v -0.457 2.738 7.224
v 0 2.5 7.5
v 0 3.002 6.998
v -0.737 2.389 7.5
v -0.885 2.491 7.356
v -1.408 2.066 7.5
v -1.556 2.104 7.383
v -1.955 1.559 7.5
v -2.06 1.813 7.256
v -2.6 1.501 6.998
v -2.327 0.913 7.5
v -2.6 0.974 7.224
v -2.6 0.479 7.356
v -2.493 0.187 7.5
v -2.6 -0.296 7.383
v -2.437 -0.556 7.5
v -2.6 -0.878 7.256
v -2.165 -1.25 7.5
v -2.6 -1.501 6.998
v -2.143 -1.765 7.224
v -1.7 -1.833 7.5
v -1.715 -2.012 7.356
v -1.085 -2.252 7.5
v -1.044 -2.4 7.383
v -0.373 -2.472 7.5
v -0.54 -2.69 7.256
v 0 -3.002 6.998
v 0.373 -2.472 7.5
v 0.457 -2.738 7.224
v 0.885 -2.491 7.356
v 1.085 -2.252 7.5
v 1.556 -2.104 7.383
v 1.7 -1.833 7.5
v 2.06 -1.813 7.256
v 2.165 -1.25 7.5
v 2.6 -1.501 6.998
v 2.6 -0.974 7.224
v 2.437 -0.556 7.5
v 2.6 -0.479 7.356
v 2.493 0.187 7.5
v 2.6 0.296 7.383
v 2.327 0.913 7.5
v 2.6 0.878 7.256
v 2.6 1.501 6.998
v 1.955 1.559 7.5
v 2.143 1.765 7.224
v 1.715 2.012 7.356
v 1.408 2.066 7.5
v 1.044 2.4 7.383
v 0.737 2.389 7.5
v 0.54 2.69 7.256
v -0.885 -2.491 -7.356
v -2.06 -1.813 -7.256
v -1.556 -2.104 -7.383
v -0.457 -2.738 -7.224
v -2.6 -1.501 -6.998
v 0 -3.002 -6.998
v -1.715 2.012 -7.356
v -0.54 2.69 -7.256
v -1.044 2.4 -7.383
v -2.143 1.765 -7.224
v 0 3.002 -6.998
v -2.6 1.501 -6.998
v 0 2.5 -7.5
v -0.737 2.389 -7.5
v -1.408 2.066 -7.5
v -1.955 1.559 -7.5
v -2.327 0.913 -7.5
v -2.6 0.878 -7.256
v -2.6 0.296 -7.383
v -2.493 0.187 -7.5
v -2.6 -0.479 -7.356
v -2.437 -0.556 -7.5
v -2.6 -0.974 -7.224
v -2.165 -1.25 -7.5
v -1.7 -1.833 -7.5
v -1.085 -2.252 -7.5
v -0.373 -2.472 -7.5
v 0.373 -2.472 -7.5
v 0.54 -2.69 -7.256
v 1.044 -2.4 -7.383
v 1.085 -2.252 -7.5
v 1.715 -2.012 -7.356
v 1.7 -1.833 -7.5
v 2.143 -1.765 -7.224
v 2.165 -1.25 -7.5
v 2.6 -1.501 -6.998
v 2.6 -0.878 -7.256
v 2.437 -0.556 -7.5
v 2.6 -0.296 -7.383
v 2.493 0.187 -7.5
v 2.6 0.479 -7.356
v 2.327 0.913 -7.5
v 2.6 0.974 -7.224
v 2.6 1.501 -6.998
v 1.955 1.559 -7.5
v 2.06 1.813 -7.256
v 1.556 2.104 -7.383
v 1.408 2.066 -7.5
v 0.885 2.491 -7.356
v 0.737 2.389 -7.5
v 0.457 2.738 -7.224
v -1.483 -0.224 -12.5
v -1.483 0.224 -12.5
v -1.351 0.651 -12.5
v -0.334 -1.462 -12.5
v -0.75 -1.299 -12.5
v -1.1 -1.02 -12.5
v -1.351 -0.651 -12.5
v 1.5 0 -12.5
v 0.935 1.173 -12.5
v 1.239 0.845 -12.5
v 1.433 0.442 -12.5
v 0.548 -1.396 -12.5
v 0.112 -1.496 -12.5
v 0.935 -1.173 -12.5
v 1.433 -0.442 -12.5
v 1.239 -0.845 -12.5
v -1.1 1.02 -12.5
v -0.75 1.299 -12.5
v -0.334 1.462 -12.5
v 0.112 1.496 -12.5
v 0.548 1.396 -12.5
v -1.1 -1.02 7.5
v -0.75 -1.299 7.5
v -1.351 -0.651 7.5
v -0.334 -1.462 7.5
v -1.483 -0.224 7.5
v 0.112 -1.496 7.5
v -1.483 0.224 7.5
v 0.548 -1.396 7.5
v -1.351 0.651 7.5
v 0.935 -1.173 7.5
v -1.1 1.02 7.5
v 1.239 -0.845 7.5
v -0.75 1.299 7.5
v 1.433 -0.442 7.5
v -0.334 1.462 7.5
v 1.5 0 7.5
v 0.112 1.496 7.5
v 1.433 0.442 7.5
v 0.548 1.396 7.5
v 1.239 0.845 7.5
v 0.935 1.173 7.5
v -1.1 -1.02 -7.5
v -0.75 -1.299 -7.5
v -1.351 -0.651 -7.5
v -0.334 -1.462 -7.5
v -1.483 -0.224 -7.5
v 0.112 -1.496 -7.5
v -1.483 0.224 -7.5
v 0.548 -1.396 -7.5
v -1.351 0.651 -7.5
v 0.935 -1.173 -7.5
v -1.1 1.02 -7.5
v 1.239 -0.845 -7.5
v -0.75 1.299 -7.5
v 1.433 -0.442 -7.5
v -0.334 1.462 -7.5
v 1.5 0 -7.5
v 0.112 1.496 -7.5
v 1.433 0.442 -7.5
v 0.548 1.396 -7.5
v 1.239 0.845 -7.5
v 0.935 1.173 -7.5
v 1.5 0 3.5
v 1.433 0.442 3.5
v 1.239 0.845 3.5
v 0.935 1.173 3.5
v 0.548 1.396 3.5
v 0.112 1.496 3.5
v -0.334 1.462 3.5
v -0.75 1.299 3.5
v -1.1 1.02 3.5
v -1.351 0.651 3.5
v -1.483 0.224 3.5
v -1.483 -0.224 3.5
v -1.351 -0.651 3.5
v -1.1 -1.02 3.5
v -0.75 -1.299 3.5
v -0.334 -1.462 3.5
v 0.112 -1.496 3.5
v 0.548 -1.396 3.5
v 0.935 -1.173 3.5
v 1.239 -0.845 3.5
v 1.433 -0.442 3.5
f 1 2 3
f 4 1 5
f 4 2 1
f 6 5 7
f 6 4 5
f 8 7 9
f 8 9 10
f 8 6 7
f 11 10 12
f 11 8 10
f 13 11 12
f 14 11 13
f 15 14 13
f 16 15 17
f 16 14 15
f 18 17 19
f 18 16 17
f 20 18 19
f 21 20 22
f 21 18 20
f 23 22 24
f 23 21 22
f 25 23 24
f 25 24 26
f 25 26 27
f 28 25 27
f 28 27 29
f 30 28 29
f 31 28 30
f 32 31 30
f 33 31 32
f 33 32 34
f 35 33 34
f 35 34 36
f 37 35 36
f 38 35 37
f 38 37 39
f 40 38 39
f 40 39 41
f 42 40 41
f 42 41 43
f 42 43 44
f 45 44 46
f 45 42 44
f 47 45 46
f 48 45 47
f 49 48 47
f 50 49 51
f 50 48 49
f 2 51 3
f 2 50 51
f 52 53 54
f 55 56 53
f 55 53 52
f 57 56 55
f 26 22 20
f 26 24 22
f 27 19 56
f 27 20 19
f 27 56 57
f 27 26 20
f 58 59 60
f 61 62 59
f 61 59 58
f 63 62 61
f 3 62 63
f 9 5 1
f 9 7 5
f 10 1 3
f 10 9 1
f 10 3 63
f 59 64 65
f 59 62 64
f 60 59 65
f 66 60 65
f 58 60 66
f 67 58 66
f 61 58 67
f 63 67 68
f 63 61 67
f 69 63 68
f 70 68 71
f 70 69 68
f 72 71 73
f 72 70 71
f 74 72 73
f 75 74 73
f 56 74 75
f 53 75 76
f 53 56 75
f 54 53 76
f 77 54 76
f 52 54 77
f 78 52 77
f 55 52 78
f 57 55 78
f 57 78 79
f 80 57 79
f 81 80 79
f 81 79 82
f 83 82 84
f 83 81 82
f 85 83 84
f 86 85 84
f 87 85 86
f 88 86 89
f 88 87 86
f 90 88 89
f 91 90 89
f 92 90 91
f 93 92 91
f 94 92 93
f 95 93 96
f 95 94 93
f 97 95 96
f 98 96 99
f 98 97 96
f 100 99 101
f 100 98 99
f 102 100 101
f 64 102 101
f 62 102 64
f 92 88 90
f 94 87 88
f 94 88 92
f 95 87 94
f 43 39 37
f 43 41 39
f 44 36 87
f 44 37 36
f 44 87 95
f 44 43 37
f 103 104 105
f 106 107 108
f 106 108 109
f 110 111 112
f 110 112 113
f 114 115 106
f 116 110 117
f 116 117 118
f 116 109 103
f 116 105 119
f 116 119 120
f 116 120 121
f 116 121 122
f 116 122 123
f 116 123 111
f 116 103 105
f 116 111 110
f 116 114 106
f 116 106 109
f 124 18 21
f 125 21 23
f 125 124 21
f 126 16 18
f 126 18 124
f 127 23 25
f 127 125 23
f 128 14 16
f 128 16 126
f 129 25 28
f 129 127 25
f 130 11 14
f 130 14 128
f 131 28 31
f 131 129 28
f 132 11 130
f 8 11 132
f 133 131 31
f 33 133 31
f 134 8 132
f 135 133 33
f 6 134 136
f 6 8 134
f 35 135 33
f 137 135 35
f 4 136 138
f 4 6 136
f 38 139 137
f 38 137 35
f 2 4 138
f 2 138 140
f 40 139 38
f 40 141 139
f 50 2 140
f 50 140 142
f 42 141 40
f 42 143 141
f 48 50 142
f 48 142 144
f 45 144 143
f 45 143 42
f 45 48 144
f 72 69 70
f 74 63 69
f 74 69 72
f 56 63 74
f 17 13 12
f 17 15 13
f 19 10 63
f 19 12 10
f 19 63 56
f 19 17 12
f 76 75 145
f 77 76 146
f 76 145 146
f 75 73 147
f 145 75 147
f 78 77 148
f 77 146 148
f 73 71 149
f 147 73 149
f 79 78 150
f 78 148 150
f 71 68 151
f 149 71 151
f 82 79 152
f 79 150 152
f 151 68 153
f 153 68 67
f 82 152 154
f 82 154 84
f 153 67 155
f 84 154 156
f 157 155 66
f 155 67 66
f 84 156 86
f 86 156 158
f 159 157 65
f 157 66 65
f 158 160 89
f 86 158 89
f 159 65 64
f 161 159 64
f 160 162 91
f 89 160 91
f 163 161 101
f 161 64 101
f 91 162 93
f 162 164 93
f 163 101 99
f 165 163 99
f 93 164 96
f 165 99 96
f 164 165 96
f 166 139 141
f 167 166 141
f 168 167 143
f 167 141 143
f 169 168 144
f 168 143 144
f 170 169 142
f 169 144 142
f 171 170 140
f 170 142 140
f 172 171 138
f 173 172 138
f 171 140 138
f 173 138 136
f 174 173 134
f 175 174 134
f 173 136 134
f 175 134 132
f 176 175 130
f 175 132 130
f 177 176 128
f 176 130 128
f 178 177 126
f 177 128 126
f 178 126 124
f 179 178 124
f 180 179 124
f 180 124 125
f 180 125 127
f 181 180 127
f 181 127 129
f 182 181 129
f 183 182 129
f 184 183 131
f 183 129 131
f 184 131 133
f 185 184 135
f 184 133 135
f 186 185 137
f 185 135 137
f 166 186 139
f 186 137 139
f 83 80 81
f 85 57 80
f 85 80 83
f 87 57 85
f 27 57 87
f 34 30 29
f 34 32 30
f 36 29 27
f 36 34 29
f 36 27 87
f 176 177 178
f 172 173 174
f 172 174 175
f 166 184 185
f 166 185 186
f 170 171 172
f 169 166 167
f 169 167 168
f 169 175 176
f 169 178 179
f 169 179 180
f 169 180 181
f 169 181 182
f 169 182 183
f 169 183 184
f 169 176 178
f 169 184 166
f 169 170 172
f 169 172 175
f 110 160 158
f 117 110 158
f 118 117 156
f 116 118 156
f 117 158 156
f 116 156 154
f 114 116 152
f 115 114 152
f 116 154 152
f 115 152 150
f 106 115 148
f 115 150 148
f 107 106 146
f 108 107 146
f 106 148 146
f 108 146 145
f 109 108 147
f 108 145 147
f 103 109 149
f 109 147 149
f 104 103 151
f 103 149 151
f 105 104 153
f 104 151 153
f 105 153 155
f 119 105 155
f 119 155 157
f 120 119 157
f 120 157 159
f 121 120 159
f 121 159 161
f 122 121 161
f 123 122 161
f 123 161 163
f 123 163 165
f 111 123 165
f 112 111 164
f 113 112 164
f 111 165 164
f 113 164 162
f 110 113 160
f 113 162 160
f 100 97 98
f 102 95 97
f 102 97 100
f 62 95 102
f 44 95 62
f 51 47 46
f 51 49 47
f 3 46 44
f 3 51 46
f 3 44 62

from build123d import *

# Parameters (mm, degrees)
PAD_DEPTH    = 7.5
SKETCH001_R  = 1.5
POCKET_DEPTH = 4
SKETCH004_R  = 1.5
PAD001_DEPTH = 5


with BuildPart() as part:
    # Sketch → Pad (new body, symmetric)
    with BuildSketch(Plane.XY):
        Polygon((2.6, 1.501111), (0, 3.002221), (-2.6, 1.501111), (-2.6, -1.501111), (0, -3.002221), (2.6, -1.501111), align=None)
    extrude(amount=PAD_DEPTH, both=True)

    # Sketch001 (on Face8 of Pad) → Pocket (cut)
    with BuildSketch(Plane.XY.offset(7.5)):
        Circle(SKETCH001_R)
    extrude(amount=-POCKET_DEPTH, mode=Mode.SUBTRACT)

    # Sketch004 (on Face4 of Pocket) → Pad001 (join)
    with BuildSketch(Plane(origin=(0, 0, -7.5), x_dir=(1, 0, 0), z_dir=(0, 0, -1))):
        Circle(SKETCH004_R)
    extrude(amount=PAD001_DEPTH)

    # Sketch005 → Groove (revolve, cut)
    with BuildSketch(Plane.YZ):
        Polygon((2, 8), (6, 8), (6, -8), (2, -8), (5, -5), (5, 5), align=None)
    revolve(axis=Axis((0, 0, 0), (0, 0, 1)), mode=Mode.SUBTRACT)


solid = part.part
